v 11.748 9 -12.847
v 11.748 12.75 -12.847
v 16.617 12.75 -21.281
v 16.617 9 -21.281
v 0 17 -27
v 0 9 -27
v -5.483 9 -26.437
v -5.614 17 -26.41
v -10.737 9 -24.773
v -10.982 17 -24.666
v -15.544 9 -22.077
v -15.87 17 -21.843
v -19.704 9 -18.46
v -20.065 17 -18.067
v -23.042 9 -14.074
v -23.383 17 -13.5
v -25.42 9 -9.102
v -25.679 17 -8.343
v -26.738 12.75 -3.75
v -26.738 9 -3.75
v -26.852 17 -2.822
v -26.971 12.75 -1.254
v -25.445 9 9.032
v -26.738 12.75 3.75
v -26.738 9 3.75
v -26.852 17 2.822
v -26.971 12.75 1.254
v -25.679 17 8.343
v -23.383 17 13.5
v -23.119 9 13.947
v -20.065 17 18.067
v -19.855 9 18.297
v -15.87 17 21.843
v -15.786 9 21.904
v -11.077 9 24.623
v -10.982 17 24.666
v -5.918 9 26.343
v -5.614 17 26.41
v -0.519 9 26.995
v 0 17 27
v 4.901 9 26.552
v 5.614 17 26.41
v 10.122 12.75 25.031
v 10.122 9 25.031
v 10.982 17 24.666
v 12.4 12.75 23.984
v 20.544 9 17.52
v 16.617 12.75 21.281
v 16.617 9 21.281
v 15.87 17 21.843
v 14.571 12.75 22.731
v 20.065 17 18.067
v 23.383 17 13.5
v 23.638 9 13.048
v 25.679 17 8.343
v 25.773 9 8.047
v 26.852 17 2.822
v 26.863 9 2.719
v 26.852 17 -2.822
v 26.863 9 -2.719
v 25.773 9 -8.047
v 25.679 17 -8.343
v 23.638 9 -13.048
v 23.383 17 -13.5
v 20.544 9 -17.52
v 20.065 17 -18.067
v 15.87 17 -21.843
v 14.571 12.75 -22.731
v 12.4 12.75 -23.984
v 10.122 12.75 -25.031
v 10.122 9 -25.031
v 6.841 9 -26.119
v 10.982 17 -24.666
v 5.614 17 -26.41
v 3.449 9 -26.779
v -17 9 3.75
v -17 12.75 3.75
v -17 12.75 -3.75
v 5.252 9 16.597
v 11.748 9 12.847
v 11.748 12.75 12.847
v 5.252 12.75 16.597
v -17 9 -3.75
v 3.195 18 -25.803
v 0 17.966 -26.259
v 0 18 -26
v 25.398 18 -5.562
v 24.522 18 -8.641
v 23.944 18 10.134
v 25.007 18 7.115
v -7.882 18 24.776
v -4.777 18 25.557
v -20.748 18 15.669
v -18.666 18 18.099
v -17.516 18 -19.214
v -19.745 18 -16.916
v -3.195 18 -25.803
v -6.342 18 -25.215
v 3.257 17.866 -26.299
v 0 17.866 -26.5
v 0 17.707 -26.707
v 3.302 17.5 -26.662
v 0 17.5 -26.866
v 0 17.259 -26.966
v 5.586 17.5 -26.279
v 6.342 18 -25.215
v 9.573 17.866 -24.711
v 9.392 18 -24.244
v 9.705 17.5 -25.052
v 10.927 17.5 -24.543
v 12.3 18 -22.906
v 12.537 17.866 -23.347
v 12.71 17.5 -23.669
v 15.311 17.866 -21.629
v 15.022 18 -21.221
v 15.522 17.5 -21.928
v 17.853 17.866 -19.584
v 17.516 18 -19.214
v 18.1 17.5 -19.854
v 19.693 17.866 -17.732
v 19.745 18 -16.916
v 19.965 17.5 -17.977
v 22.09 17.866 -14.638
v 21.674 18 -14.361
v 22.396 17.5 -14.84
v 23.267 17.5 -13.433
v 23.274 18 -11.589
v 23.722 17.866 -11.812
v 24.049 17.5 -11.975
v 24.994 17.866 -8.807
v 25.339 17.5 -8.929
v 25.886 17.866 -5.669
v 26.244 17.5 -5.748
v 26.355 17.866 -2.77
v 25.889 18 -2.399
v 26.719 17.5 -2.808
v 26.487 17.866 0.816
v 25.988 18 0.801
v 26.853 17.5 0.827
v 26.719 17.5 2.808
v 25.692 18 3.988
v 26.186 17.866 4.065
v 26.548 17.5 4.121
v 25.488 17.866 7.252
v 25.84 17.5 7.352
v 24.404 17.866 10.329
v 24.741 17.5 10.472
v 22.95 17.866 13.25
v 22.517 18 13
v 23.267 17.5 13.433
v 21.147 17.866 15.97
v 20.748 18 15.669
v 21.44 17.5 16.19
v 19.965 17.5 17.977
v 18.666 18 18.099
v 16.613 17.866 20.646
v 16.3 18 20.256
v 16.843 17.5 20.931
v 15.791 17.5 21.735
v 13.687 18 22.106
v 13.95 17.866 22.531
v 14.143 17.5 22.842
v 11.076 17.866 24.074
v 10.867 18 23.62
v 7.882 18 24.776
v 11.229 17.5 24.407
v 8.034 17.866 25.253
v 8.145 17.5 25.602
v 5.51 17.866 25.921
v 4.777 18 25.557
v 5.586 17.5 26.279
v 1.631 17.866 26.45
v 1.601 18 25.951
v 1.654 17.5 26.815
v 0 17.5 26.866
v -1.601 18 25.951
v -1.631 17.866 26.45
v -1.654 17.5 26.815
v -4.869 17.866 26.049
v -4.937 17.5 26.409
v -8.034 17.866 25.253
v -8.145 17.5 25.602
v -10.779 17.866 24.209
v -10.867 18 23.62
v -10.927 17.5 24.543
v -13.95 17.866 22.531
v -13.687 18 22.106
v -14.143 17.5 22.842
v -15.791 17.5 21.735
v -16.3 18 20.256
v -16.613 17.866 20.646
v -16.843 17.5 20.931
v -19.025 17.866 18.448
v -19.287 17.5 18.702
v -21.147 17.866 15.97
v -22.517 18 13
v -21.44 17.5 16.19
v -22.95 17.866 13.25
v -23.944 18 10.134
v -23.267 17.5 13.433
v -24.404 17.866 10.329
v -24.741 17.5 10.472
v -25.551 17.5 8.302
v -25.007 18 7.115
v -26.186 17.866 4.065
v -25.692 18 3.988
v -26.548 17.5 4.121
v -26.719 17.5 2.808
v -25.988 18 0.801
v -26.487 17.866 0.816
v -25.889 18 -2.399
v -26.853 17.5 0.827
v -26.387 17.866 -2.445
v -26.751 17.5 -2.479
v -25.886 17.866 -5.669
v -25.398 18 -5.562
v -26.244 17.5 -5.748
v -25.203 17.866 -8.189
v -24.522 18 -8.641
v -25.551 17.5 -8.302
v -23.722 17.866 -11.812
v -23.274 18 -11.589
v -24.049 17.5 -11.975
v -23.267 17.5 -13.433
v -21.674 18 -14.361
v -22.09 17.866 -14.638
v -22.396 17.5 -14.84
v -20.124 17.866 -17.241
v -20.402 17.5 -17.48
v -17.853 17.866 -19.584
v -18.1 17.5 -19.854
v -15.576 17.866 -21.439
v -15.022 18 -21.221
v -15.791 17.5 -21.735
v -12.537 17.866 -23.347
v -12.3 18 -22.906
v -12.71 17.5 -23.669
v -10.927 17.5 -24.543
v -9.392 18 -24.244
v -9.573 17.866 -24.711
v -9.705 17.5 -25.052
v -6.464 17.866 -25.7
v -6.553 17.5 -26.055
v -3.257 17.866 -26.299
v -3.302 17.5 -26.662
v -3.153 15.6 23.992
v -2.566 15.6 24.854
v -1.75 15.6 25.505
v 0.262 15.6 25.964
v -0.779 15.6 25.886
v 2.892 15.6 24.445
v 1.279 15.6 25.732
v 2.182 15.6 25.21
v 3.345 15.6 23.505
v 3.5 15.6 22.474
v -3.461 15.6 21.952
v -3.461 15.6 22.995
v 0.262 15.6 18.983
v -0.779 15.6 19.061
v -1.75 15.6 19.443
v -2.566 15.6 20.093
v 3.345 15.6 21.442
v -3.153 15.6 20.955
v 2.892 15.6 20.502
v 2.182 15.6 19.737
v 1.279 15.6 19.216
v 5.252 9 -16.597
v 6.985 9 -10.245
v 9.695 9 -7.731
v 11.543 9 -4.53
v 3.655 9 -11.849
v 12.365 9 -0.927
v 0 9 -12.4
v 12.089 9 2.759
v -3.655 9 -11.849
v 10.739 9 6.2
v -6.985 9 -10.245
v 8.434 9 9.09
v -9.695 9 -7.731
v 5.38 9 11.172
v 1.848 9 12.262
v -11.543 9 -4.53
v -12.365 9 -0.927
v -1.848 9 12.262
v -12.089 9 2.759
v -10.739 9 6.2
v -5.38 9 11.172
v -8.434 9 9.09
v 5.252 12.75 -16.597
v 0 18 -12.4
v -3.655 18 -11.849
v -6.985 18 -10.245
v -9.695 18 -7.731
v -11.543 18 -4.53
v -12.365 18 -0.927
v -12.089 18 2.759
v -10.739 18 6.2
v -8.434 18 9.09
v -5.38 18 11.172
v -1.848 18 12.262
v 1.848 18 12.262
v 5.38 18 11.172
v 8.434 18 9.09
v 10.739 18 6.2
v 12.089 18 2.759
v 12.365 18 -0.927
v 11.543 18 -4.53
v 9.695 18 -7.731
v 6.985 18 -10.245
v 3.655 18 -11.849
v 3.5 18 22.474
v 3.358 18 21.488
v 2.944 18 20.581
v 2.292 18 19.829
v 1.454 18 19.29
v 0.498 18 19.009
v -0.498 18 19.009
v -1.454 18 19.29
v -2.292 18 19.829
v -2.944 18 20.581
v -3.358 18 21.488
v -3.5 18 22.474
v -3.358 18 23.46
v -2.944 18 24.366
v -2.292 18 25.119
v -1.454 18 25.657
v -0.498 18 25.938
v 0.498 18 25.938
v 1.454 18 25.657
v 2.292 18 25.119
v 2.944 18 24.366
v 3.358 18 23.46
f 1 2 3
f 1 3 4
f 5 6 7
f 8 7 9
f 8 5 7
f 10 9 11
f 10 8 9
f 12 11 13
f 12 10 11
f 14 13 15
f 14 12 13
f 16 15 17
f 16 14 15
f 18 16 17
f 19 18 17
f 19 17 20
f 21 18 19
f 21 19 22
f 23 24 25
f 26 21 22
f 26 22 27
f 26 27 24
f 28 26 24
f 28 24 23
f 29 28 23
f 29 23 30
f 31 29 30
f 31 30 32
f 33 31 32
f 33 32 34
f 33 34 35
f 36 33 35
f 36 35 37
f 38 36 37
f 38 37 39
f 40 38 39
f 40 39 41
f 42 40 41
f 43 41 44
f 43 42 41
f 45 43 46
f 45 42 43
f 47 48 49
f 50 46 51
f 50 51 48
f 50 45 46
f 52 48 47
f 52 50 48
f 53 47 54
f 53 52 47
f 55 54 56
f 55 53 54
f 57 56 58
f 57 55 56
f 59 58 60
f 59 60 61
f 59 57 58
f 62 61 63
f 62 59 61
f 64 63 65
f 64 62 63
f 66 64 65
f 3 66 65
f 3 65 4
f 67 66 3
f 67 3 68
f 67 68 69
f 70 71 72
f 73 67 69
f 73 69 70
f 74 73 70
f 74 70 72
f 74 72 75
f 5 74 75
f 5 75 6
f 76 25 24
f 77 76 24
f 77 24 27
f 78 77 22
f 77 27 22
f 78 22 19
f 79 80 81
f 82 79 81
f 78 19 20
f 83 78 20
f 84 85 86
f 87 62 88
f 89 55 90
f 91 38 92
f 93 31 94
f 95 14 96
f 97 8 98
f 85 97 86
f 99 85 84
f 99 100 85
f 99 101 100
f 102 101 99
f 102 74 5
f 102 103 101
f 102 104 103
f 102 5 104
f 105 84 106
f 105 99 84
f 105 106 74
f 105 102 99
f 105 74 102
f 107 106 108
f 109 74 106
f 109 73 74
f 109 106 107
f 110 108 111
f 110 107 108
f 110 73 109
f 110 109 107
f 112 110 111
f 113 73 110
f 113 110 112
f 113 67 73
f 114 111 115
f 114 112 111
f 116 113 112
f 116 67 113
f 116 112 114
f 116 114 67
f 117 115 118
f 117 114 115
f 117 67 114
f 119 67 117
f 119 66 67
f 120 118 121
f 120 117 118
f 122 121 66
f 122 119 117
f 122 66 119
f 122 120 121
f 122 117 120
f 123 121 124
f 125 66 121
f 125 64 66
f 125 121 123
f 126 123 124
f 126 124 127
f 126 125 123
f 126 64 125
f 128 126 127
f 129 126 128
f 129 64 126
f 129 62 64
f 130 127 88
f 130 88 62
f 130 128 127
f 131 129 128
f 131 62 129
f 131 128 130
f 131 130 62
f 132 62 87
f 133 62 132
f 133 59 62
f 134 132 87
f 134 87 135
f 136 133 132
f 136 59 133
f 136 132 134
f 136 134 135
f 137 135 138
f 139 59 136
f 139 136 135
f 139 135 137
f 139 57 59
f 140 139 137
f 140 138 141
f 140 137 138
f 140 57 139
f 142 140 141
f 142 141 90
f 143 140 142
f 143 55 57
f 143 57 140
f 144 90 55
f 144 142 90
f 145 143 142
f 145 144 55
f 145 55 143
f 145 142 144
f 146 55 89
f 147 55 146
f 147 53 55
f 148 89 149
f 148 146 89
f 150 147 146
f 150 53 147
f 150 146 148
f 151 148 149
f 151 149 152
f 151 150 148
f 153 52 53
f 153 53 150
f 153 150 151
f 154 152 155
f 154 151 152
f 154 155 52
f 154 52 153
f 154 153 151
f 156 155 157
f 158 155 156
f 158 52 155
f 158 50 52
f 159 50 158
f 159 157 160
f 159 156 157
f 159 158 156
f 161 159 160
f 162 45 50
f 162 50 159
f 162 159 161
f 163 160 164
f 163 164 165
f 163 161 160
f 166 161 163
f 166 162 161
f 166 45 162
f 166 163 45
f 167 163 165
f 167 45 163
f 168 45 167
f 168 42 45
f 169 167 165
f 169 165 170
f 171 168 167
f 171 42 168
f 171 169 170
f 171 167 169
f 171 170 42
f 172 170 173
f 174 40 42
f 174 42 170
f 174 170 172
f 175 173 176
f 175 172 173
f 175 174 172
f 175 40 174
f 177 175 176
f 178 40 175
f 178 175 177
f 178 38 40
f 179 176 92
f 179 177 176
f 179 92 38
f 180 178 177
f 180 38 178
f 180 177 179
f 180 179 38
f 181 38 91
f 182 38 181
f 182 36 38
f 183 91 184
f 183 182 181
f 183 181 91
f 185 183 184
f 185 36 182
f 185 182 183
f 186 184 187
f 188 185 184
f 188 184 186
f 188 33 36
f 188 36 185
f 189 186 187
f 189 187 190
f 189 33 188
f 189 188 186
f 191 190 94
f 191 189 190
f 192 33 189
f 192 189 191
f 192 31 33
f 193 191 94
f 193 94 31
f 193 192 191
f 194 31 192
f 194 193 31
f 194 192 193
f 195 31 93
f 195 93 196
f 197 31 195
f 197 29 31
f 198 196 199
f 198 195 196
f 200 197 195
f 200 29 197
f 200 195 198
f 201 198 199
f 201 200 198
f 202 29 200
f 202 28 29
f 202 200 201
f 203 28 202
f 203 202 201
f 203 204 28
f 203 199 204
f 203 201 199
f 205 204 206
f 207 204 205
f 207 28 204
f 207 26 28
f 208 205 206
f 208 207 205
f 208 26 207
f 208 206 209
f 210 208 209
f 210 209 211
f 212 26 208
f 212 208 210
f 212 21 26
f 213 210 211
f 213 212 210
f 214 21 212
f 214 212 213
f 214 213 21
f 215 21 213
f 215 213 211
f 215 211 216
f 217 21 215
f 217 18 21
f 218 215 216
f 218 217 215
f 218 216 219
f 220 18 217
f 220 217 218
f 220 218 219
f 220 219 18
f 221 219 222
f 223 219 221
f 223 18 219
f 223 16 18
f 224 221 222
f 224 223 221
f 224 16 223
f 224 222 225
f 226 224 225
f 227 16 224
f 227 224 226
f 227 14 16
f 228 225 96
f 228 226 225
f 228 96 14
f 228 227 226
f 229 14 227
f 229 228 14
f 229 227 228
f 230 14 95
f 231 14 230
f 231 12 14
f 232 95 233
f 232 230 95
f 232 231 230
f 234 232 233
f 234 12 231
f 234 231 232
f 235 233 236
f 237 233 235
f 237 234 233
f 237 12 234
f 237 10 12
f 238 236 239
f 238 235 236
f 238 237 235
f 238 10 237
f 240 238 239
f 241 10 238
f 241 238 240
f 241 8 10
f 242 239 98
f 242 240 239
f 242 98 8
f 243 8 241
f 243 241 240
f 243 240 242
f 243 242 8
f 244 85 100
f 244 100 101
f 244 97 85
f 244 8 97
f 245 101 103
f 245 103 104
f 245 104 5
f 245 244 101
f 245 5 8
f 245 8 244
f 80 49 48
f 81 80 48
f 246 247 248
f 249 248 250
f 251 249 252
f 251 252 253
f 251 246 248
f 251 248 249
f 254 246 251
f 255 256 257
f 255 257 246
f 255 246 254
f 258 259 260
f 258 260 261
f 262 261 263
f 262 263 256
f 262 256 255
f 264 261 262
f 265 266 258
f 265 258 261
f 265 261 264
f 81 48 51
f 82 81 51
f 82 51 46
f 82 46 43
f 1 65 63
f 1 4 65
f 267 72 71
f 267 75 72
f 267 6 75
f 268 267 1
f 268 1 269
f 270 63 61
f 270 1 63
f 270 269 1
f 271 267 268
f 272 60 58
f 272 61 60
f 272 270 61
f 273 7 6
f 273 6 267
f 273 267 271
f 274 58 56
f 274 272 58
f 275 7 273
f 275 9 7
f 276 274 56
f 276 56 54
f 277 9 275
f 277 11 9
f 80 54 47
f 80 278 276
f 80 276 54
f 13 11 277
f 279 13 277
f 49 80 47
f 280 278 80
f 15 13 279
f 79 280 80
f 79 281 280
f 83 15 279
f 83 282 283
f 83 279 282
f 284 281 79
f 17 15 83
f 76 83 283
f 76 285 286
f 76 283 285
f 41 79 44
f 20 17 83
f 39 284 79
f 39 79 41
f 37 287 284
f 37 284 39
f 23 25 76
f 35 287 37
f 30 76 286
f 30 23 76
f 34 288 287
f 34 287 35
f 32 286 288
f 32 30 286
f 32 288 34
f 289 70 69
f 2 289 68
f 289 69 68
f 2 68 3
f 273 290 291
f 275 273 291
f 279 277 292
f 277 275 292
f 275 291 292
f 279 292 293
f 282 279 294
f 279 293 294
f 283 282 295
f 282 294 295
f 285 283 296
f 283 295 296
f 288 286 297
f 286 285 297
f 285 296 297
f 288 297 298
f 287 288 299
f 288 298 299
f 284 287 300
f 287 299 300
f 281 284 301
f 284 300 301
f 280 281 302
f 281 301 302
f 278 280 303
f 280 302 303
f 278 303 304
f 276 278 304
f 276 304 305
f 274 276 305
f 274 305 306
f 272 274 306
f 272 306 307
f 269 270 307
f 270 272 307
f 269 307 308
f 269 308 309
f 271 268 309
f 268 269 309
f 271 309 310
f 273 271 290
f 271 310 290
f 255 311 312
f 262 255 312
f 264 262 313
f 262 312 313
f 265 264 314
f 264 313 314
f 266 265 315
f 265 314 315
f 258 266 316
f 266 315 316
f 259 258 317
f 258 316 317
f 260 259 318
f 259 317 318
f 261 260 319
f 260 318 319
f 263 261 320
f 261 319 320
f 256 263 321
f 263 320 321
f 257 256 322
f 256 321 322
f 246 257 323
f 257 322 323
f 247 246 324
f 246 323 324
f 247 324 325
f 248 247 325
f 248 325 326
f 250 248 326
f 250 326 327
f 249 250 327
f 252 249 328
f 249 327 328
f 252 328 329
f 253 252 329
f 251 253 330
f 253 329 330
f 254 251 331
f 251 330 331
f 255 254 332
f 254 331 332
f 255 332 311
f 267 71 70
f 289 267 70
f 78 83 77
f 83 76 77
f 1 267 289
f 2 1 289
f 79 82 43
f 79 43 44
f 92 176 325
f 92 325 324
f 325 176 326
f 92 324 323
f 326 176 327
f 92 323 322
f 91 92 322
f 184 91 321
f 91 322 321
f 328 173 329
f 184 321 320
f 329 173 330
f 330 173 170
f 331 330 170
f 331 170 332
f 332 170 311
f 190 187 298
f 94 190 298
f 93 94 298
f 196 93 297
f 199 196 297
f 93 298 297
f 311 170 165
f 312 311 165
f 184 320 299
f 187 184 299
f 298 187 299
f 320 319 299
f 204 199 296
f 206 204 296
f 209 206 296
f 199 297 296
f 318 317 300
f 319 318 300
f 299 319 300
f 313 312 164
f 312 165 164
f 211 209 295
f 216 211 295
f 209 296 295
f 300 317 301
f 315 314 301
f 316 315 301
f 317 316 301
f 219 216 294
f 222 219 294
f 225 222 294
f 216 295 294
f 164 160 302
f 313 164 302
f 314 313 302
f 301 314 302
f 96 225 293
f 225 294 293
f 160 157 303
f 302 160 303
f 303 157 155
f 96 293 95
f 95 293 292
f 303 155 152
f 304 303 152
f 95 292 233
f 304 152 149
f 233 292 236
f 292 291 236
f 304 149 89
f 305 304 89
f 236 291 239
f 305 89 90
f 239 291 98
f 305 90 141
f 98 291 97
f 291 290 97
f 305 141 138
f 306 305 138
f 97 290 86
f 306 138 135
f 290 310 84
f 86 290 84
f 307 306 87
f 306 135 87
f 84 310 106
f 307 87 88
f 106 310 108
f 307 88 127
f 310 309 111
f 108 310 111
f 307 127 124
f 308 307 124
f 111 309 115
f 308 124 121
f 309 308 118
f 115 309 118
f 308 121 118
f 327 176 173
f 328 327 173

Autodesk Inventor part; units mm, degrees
ref_plane "XY Plane" through (0, 0, 0) normal (0, 0, 1) x (1, 0, 0)
sketch "Sketch3" plane through (0, 0, 0) normal (1, 0, 0) x (0, 1, 0)
  line L0 (63.5252, 0) -> (0, 0) construction
  line L1 (0, -8) -> (0, -27)
  line L2 (0, -27) -> (18, -27)
  line L3 (18, -27) -> (18, -12.4)
  line L4 (9, -8) -> (9, -12.4)
  line L5 (9, -12.4) -> (18, -12.4)
  line L6 (9, -8) -> (5, -8)
  line L7 (5, -8) -> (5, 0)
  line L8 (0, -8) -> (0, 0)
  line L9 (5, 0) -> (0, 0)
  dimension "d15" = 18
  dimension "d18" = 9
  dimension "d32" = 27
  dimension "d33" = 12.4
  dimension "d54" = 4
  dimension "d56" = 8
revolve "Revolution1" add sketch "Sketch3" angle 360 about axis through (0, 63.5252, 0) along (0, -1, 0)
fillet "Fillet2" radius 1 2 edges at (0, 18, 27) (0, 0, 27)
ref_plane "Work Plane2" through (-27, 9, 0) normal (1, 0, 0) x (0, 1, 0)
sketch "Sketch4" plane through (-27, 9, 0) normal (1, 0, 0) x (0, 1, 0)
  line L0 (-9, 0) -> (10.8256, 0) construction
  line L1 (-3.75, 3.75) -> (3.75, 3.75)
  line L2 (3.75, 3.75) -> (3.75, -3.75)
  line L3 (3.75, -3.75) -> (-3.75, -3.75)
  line L4 (-3.75, -3.75) -> (-3.75, 3.75)
  line L5 (-3.75, 3.75) -> (3.75, -3.75) construction
  line L6 (3.75, 3.75) -> (-3.75, -3.75) construction
  line L7 (9, 26) -> (9, -26) projected
  point P0 (0, 0)
  dimension "d21" = 7.5
  dimension "d22" = 7.5
  dimension "d55" = 9
extrude "Extrusion3" cut sketch "Sketch4" along normal blind 10
pattern_circular "Circular Pattern2" count 3 over 360 about axis through (0, 13.5, 0) along (0, -1, 0) of "Extrusion3"
sketch "Sketch9" plane through (0, 18, 0) normal (0, 1, 0) x (1, 0, 0)
  circle A0 centre (0, -22.4737) radius 3.5
  point P0 (0, 0)
  dimension "d57" = 7
extrude "Extrusion7" cut sketch "Sketch9" against normal blind 2.4
ref_plane "Work Plane4" through (0, 9, 0) normal (0, 1, 0) x (-1, 0, 0)
split "Split1" plane through (0, 9, 0) removes the side toward (0, -1, 0)
properties part number "BasePaletas"
